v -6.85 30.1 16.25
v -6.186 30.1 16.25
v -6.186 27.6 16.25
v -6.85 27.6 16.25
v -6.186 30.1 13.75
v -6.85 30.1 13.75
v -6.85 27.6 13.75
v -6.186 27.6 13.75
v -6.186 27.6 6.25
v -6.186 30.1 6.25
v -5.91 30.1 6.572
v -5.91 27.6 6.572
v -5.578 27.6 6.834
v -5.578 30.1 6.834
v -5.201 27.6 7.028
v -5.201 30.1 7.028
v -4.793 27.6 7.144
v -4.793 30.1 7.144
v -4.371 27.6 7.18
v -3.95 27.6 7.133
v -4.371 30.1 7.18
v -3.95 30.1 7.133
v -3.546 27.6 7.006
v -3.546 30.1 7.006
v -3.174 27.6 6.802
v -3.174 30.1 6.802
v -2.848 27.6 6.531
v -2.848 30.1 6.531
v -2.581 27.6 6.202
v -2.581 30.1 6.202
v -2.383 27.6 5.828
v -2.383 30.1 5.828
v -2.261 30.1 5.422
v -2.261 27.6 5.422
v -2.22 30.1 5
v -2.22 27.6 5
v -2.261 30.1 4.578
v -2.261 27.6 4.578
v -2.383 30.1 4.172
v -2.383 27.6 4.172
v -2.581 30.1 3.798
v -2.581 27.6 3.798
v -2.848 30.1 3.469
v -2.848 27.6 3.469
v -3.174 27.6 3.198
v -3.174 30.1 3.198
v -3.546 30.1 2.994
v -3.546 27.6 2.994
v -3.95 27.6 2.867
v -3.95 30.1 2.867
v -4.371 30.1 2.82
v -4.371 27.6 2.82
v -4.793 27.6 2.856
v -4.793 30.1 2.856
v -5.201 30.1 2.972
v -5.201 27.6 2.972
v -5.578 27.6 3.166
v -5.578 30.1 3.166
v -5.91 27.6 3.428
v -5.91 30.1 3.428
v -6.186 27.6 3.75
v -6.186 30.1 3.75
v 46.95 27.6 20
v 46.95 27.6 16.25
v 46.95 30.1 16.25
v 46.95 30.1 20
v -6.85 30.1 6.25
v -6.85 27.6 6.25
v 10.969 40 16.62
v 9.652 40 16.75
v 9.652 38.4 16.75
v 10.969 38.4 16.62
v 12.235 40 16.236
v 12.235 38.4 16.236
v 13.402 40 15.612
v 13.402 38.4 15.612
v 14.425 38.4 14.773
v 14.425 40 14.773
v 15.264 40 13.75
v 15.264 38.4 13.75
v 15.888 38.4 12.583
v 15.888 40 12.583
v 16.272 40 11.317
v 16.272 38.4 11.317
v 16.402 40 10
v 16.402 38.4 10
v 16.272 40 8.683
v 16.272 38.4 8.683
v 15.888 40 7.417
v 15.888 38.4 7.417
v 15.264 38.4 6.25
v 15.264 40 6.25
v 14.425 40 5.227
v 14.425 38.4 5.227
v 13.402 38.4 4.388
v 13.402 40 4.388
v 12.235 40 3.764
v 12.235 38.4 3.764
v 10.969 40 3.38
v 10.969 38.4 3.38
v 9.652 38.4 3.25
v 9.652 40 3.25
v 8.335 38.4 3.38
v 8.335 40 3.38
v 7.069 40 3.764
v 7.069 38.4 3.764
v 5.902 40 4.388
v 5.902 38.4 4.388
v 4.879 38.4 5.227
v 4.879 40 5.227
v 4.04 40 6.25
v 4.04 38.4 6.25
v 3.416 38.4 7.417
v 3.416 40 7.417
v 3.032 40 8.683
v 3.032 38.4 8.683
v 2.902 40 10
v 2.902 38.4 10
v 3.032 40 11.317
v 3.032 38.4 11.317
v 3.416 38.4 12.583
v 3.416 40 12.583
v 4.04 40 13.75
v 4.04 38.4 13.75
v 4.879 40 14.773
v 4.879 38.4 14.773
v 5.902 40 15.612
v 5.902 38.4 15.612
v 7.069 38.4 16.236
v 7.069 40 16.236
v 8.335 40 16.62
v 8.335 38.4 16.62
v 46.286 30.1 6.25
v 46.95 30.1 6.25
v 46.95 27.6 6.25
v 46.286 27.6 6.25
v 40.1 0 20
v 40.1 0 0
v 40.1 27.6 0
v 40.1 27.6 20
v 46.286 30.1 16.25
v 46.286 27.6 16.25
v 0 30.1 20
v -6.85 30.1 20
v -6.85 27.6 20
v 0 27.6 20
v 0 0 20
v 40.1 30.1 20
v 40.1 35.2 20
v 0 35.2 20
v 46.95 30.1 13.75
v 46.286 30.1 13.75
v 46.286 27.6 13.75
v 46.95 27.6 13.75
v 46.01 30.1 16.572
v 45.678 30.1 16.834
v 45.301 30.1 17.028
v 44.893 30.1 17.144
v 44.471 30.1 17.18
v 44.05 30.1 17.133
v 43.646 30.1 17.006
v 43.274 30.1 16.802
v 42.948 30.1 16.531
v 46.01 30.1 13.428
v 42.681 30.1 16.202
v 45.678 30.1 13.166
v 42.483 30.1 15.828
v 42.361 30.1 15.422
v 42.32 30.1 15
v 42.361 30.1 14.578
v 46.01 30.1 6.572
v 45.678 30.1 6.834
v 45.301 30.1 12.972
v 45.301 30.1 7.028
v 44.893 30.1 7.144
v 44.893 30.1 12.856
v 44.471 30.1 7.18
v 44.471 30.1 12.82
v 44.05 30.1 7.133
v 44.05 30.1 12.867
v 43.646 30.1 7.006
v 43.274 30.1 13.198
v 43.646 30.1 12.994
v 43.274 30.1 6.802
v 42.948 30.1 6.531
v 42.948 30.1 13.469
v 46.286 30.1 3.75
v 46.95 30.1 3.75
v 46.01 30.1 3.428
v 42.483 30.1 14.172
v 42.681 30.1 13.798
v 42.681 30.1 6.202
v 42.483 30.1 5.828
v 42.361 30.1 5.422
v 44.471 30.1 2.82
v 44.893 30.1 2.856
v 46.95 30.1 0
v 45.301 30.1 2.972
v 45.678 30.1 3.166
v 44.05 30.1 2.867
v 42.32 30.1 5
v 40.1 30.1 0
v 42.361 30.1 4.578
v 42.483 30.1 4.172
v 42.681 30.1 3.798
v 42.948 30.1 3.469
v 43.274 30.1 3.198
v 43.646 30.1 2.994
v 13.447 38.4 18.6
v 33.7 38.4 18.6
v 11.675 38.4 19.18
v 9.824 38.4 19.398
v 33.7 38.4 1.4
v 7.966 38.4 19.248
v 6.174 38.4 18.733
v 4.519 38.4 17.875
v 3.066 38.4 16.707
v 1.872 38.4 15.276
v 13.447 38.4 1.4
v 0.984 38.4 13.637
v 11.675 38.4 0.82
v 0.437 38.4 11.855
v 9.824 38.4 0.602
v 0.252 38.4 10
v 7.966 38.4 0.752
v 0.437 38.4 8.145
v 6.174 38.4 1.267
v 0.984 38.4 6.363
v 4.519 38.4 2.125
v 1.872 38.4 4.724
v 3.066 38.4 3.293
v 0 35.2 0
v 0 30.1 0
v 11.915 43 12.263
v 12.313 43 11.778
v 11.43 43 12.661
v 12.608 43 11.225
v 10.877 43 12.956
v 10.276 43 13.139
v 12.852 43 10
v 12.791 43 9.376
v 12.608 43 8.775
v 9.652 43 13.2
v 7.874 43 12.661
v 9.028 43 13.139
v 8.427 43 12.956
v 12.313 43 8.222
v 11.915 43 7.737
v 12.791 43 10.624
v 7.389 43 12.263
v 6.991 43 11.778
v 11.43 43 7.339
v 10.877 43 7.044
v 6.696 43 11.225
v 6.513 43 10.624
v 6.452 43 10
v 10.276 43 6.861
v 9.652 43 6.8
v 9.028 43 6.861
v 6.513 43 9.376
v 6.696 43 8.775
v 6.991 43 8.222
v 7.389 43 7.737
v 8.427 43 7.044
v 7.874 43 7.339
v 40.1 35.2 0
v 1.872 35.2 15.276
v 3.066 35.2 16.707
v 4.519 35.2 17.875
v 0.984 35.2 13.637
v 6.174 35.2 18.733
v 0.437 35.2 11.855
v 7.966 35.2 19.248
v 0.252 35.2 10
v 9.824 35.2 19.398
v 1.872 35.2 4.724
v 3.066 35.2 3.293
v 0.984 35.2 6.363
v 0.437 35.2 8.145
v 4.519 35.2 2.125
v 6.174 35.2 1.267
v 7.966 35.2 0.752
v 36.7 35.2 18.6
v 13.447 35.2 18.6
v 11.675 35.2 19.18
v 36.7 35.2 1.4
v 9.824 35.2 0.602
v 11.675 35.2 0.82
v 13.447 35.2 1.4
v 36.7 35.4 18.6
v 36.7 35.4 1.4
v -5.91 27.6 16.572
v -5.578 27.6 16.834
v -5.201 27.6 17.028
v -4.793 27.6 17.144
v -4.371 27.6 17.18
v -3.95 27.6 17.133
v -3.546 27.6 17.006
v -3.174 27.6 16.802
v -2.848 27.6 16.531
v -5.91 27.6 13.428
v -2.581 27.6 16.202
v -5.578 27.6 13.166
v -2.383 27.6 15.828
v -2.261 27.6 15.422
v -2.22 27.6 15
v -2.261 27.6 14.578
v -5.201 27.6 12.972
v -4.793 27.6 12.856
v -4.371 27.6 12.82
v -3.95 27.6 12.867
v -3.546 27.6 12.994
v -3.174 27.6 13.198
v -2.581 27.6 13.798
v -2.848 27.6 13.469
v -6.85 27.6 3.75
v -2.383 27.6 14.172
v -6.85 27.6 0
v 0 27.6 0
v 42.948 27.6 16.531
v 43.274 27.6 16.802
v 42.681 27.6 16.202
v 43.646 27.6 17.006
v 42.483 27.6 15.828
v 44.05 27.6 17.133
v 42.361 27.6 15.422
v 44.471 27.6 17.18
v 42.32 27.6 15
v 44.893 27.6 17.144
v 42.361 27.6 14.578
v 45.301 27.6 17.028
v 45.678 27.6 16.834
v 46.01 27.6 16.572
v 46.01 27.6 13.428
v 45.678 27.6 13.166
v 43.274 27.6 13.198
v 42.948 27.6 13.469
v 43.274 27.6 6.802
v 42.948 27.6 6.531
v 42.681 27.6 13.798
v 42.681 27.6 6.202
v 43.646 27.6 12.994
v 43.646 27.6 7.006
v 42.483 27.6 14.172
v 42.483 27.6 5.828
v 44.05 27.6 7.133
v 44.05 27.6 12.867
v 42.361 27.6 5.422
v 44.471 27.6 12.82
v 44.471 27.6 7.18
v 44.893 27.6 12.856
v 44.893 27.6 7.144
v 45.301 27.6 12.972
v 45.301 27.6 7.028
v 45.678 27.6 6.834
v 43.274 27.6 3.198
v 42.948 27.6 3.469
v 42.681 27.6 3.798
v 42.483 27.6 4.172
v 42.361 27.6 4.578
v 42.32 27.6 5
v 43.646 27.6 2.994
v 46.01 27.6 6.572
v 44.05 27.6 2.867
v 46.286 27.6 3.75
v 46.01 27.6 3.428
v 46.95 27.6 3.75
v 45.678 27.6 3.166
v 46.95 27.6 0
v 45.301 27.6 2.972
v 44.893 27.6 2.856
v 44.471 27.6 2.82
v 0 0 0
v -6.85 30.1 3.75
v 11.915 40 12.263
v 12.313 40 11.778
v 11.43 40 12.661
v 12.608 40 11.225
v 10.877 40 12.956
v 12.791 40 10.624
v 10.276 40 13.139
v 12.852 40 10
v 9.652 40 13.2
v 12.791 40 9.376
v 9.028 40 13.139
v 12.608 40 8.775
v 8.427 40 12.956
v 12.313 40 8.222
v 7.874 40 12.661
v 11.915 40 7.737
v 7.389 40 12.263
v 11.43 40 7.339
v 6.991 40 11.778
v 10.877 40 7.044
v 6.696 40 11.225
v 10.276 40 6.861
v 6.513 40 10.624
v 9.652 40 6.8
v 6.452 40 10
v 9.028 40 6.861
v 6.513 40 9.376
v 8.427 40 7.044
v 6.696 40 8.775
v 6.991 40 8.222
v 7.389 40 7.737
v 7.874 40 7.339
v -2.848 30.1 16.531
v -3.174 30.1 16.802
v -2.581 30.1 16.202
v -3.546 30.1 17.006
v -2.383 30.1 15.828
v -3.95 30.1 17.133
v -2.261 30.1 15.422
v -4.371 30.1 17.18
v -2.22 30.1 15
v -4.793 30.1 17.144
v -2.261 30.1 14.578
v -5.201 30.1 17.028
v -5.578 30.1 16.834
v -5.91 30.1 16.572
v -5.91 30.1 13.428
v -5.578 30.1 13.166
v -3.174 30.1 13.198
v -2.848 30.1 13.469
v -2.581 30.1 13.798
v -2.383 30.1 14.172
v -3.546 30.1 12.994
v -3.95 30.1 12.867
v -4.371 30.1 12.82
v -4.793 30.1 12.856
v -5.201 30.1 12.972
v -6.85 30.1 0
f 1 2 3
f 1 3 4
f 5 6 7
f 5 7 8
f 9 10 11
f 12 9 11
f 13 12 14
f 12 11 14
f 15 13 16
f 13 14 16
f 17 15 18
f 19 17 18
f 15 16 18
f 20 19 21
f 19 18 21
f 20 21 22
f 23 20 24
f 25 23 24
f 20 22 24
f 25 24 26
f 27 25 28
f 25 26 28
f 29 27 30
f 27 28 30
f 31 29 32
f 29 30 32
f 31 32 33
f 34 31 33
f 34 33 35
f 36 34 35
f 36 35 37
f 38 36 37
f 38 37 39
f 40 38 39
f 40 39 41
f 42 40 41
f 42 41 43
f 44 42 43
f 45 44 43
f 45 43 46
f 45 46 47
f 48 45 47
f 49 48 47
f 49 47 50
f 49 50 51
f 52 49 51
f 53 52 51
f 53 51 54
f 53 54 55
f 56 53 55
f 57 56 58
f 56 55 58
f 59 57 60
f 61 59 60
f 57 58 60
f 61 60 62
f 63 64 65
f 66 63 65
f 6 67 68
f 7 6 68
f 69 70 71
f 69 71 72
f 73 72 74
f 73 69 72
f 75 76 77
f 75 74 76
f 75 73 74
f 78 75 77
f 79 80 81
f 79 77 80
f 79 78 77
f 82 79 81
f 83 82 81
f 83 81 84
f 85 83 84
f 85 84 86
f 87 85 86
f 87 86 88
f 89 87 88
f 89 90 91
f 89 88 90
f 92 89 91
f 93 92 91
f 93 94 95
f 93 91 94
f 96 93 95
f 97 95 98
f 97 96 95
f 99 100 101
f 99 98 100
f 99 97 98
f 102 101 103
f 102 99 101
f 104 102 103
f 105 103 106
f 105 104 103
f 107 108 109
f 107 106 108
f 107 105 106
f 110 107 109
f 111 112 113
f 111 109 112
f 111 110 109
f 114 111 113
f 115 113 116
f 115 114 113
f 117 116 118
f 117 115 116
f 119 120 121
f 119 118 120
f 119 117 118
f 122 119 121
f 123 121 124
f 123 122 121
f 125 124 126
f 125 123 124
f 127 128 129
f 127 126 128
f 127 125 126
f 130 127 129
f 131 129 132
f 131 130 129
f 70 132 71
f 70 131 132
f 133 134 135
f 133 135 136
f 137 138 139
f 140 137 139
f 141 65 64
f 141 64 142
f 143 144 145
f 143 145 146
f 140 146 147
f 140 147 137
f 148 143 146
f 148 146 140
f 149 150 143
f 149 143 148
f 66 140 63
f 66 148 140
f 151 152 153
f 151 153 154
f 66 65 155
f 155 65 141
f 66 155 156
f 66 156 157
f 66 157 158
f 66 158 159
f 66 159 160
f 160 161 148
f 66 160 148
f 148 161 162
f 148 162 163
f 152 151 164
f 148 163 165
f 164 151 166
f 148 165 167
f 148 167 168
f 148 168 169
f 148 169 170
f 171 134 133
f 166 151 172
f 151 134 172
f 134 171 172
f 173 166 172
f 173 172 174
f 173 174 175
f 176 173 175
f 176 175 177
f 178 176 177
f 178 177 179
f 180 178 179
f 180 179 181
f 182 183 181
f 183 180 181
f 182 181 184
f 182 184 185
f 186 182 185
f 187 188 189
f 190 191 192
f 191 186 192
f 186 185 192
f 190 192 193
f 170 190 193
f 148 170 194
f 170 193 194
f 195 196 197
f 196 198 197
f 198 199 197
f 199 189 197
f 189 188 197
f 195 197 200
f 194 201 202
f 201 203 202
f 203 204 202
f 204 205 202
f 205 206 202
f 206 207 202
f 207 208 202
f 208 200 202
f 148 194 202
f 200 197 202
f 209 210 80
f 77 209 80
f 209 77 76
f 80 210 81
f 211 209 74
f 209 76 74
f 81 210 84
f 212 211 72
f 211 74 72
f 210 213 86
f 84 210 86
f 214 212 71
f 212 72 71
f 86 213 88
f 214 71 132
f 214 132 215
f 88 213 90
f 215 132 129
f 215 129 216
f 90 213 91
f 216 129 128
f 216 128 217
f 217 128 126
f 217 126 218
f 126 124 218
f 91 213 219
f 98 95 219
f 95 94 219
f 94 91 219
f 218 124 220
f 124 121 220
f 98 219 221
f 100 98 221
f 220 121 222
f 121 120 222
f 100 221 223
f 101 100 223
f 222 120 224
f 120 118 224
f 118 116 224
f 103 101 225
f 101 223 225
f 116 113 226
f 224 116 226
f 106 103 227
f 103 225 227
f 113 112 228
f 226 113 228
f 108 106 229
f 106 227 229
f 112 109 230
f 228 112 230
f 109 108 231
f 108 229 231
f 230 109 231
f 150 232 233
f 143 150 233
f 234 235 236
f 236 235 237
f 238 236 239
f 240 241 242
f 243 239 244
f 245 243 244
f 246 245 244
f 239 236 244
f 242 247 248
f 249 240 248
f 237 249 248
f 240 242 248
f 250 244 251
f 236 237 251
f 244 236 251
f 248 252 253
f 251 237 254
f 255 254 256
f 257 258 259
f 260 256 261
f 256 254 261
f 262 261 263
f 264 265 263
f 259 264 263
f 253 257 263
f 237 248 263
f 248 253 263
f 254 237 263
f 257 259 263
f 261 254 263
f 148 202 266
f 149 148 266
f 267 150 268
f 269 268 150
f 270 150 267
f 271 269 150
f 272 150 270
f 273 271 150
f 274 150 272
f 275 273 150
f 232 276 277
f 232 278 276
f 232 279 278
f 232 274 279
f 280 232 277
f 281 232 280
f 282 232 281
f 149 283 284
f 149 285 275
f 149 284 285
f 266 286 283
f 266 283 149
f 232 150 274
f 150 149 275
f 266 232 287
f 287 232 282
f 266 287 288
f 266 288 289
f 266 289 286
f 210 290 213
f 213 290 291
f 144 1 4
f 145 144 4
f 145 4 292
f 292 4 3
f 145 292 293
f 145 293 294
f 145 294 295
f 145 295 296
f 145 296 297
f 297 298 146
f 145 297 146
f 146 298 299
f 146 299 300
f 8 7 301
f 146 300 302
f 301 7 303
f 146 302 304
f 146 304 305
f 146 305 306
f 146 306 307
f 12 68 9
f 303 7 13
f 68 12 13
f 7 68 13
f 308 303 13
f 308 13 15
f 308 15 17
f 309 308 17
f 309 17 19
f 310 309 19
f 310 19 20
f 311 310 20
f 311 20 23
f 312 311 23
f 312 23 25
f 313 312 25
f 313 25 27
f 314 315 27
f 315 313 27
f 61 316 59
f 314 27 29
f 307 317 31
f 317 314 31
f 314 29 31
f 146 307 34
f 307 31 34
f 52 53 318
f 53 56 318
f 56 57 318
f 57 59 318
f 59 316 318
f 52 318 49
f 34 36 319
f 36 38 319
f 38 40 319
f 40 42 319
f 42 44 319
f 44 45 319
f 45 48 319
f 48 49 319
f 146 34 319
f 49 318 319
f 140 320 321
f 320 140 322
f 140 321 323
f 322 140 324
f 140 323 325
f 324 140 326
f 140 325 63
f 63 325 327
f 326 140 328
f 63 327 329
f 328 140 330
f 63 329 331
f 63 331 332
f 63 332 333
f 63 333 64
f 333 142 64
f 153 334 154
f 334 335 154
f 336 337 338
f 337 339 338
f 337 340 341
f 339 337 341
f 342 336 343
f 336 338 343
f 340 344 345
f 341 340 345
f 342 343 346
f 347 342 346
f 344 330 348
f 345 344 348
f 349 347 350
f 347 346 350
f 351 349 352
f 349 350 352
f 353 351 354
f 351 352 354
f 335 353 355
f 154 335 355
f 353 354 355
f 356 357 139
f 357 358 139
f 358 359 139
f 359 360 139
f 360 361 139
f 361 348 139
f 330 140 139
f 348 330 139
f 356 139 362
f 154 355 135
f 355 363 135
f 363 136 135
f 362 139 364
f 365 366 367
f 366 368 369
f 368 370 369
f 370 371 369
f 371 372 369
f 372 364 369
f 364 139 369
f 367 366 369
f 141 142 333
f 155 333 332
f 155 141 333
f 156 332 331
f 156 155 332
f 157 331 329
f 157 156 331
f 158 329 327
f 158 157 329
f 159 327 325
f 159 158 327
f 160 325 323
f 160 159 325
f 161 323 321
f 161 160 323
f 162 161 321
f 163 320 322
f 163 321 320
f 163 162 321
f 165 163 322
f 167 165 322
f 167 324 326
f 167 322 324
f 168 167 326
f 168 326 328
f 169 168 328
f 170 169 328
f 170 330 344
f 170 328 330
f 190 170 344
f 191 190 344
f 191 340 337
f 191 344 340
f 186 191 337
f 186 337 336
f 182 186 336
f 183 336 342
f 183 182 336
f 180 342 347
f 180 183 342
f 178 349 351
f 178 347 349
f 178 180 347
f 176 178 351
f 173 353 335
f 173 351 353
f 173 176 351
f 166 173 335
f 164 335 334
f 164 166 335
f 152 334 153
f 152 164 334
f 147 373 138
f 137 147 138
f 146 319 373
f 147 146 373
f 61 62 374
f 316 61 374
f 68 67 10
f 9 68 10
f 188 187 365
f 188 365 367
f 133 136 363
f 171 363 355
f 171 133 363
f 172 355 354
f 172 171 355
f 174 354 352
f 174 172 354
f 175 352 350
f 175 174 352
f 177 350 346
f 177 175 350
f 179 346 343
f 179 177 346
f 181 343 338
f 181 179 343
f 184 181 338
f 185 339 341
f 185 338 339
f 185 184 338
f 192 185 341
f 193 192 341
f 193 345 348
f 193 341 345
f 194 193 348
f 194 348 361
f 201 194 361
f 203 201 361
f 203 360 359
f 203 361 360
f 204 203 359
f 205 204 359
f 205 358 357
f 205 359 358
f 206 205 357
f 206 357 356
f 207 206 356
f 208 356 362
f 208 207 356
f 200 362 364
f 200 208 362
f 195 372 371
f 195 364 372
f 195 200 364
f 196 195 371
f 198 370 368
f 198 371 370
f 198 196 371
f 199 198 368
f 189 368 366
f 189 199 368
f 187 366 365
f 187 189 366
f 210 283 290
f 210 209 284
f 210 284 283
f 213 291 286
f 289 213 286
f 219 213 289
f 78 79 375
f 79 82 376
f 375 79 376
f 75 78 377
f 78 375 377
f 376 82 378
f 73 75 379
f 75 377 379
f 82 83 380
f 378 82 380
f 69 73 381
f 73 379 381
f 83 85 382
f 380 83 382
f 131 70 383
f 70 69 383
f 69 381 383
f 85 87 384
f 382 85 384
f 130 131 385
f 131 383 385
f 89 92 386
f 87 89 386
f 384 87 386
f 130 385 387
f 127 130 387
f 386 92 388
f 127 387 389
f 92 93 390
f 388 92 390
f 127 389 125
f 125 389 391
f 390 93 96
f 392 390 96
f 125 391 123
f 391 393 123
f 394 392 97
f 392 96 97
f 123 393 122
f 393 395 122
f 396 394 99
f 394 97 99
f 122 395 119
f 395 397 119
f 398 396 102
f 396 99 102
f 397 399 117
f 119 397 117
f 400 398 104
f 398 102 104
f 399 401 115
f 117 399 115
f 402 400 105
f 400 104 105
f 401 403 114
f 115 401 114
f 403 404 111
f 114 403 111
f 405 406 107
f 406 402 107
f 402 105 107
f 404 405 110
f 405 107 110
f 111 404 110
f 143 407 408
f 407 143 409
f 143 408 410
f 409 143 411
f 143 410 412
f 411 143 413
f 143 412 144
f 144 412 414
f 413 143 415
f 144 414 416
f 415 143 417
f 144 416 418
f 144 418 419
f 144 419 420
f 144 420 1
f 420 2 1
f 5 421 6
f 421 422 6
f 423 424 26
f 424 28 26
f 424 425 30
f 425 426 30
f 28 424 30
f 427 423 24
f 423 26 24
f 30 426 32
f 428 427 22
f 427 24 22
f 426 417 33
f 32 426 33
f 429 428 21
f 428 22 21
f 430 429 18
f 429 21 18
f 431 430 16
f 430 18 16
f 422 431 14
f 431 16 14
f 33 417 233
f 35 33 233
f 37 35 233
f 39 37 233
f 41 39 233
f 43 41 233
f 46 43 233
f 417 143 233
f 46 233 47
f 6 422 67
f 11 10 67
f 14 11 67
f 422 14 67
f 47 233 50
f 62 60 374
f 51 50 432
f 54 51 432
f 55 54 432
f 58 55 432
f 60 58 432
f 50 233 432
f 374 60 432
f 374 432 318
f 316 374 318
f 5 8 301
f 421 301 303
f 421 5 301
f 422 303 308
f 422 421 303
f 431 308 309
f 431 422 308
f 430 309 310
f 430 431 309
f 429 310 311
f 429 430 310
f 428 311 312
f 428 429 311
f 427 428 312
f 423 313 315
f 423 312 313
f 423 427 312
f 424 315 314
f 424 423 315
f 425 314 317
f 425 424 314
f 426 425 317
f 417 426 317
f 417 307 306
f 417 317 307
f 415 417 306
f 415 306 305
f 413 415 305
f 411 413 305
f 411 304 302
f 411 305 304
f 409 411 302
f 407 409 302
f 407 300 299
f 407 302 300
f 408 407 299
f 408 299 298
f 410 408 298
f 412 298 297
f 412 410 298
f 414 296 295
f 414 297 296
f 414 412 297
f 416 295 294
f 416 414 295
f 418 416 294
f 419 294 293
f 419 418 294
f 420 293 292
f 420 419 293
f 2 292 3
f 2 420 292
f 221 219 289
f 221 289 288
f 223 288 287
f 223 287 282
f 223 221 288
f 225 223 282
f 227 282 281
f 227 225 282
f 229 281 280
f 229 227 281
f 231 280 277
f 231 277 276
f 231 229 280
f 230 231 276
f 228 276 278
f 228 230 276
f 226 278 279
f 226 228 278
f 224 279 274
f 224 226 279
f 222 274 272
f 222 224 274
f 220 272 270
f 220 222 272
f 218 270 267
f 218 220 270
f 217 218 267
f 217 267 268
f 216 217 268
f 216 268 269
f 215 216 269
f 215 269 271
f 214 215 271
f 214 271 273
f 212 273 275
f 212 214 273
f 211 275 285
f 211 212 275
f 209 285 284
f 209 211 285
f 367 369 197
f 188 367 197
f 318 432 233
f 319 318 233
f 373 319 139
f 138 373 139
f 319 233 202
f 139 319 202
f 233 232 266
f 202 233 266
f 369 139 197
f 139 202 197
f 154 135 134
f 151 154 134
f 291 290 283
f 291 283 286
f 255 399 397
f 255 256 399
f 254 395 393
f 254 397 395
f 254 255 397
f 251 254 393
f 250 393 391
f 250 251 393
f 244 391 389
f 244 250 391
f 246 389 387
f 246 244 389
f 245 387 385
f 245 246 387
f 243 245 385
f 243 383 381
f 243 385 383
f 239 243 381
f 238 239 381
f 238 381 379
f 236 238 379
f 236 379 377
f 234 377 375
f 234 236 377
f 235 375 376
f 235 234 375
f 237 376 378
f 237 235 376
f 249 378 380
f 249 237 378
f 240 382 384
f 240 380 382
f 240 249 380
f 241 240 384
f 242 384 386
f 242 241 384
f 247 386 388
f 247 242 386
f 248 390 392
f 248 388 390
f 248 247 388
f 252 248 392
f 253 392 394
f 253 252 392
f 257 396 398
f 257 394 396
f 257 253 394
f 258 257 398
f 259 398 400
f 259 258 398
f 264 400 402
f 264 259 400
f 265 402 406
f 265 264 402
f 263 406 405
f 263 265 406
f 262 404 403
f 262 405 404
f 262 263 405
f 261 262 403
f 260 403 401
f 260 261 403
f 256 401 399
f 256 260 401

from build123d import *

# Parameters (mm, degrees)
BOSS_EXTRU_1_DEPTH      = 20
ENL_V_MAT_EXTRU_1_DEPTH = 60.247890258
ESQUISSE5_W             = 53.8
ESQUISSE5_H             = 20
ESQUISSE5_R             = 3.2
ENL_V_MAT_EXTRU_2_DEPTH = 3
ESQUISSE6_W             = 53.8
ESQUISSE6_H             = 20
ESQUISSE6_R             = 6.75
ENL_V_MAT_EXTRU_3_DEPTH = 1.6
ESQUISSE7_W             = 53.8
ESQUISSE7_H             = 20
ENL_V_MAT_EXTRU_4_DEPTH = 3.2
CHANFREIN2_SIZE         = 3


with BuildPart() as part:
    # Esquisse1 → Boss.-Extru.1 (new body)
    with BuildSketch(Plane.XY):
        Polygon((0, 0), (40.1, 0), (40.1, 27.6), (46.95, 27.6), (46.95, 30.1), (40.1, 30.1), (40.1, 35.2), (36.7, 35.2), (36.7, 38.4), (16.402, 38.4), (16.402, 40), (12.852, 40), (12.852, 43), (6.452, 43), (6.452, 40), (2.902, 40), (2.902, 38.4), (0, 38.4), (0, 30.1), (-6.85, 30.1), (-6.85, 27.6), (0, 27.6), align=None)
    extrude(amount=BOSS_EXTRU_1_DEPTH)

    # Esquisse2 → Enlèv. mat.-Extru.1 (cut, through all)
    with BuildSketch(Plane(origin=(0, 30.1, 0), x_dir=(1, 0, 0), z_dir=(0, 1, 0))):
        with BuildLine():
            Line((-6.85, -3.75), (-6.85, -6.25))
            Line((-6.85, -6.25), (-6.186029115, -6.25))
            ThreePointArc((-6.186029115, -6.25), (-2.22, -5), (-6.186029115, -3.75))
            Line((-6.186029115, -3.75), (-6.85, -3.75))
        make_face()
        with BuildLine():
            Line((46.95, -6.25), (46.286029115, -6.25))
            ThreePointArc((46.286029115, -6.25), (42.32, -5), (46.286029115, -3.75))
            Line((46.286029115, -3.75), (46.95, -3.75))
            Line((46.95, -3.75), (46.95, -6.25))
        make_face()
        with BuildLine():
            Line((46.95, -16.25), (46.286029115, -16.25))
            ThreePointArc((46.286029115, -16.25), (42.32, -15), (46.286029115, -13.75))
            Line((46.286029115, -13.75), (46.95, -13.75))
            Line((46.95, -13.75), (46.95, -16.25))
        make_face()
        with BuildLine():
            Line((-6.85, -13.75), (-6.186029115, -13.75))
            ThreePointArc((-6.186029115, -13.75), (-2.22, -15), (-6.186029115, -16.25))
            Line((-6.186029115, -16.25), (-6.85, -16.25))
            Line((-6.85, -16.25), (-6.85, -13.75))
        make_face()
    extrude(amount=-ENL_V_MAT_EXTRU_1_DEPTH, mode=Mode.SUBTRACT)

    # Esquisse5 → Enlèv. mat.-Extru.2 (cut)
    with BuildSketch(Plane(origin=(0, 43, 0), x_dir=(1, 0, 0), z_dir=(0, 1, 0))):
        with Locations((20.05, -10)):
            Rectangle(ESQUISSE5_W, ESQUISSE5_H)
        with Locations(Location((9.652, -10, 0), (0, 0, 180))):
            Circle(ESQUISSE5_R, mode=Mode.SUBTRACT)
    extrude(amount=-ENL_V_MAT_EXTRU_2_DEPTH, mode=Mode.SUBTRACT)

    # Esquisse6 → Enlèv. mat.-Extru.3 (cut)
    with BuildSketch(Plane(origin=(0, 40, 0), x_dir=(1, 0, 0), z_dir=(0, 1, 0))):
        with Locations((20.05, -10)):
            Rectangle(ESQUISSE6_W, ESQUISSE6_H)
        with Locations(Location((9.652, -10, 0), (0, 0, 270))):
            Circle(ESQUISSE6_R, mode=Mode.SUBTRACT)
    extrude(amount=-ENL_V_MAT_EXTRU_3_DEPTH, mode=Mode.SUBTRACT)

    # Esquisse7 → Enlèv. mat.-Extru.4 (cut)
    with BuildSketch(Plane(origin=(0, 38.4, 0), x_dir=(1, 0, 0), z_dir=(0, 1, 0))):
        with Locations((20.05, -10)):
            Rectangle(ESQUISSE7_W, ESQUISSE7_H)
        with BuildLine():
            Line((13.446733192, -18.6), (36.7, -18.6))
            Line((36.7, -18.6), (36.7, -1.4))
            Line((36.7, -1.4), (13.446733192, -1.4))
            ThreePointArc((13.446733192, -1.4), (0.252, -10), (13.446733192, -18.6))
        make_face(mode=Mode.SUBTRACT)
    extrude(amount=-ENL_V_MAT_EXTRU_4_DEPTH, mode=Mode.SUBTRACT)

    # Chanfrein2
    chanfrein2_edges = [part.edges().sort_by_distance(p)[0] for p in [
        (36.7, 38.4, 10),
    ]]
    chamfer(chanfrein2_edges, length=CHANFREIN2_SIZE)


solid = part.part
